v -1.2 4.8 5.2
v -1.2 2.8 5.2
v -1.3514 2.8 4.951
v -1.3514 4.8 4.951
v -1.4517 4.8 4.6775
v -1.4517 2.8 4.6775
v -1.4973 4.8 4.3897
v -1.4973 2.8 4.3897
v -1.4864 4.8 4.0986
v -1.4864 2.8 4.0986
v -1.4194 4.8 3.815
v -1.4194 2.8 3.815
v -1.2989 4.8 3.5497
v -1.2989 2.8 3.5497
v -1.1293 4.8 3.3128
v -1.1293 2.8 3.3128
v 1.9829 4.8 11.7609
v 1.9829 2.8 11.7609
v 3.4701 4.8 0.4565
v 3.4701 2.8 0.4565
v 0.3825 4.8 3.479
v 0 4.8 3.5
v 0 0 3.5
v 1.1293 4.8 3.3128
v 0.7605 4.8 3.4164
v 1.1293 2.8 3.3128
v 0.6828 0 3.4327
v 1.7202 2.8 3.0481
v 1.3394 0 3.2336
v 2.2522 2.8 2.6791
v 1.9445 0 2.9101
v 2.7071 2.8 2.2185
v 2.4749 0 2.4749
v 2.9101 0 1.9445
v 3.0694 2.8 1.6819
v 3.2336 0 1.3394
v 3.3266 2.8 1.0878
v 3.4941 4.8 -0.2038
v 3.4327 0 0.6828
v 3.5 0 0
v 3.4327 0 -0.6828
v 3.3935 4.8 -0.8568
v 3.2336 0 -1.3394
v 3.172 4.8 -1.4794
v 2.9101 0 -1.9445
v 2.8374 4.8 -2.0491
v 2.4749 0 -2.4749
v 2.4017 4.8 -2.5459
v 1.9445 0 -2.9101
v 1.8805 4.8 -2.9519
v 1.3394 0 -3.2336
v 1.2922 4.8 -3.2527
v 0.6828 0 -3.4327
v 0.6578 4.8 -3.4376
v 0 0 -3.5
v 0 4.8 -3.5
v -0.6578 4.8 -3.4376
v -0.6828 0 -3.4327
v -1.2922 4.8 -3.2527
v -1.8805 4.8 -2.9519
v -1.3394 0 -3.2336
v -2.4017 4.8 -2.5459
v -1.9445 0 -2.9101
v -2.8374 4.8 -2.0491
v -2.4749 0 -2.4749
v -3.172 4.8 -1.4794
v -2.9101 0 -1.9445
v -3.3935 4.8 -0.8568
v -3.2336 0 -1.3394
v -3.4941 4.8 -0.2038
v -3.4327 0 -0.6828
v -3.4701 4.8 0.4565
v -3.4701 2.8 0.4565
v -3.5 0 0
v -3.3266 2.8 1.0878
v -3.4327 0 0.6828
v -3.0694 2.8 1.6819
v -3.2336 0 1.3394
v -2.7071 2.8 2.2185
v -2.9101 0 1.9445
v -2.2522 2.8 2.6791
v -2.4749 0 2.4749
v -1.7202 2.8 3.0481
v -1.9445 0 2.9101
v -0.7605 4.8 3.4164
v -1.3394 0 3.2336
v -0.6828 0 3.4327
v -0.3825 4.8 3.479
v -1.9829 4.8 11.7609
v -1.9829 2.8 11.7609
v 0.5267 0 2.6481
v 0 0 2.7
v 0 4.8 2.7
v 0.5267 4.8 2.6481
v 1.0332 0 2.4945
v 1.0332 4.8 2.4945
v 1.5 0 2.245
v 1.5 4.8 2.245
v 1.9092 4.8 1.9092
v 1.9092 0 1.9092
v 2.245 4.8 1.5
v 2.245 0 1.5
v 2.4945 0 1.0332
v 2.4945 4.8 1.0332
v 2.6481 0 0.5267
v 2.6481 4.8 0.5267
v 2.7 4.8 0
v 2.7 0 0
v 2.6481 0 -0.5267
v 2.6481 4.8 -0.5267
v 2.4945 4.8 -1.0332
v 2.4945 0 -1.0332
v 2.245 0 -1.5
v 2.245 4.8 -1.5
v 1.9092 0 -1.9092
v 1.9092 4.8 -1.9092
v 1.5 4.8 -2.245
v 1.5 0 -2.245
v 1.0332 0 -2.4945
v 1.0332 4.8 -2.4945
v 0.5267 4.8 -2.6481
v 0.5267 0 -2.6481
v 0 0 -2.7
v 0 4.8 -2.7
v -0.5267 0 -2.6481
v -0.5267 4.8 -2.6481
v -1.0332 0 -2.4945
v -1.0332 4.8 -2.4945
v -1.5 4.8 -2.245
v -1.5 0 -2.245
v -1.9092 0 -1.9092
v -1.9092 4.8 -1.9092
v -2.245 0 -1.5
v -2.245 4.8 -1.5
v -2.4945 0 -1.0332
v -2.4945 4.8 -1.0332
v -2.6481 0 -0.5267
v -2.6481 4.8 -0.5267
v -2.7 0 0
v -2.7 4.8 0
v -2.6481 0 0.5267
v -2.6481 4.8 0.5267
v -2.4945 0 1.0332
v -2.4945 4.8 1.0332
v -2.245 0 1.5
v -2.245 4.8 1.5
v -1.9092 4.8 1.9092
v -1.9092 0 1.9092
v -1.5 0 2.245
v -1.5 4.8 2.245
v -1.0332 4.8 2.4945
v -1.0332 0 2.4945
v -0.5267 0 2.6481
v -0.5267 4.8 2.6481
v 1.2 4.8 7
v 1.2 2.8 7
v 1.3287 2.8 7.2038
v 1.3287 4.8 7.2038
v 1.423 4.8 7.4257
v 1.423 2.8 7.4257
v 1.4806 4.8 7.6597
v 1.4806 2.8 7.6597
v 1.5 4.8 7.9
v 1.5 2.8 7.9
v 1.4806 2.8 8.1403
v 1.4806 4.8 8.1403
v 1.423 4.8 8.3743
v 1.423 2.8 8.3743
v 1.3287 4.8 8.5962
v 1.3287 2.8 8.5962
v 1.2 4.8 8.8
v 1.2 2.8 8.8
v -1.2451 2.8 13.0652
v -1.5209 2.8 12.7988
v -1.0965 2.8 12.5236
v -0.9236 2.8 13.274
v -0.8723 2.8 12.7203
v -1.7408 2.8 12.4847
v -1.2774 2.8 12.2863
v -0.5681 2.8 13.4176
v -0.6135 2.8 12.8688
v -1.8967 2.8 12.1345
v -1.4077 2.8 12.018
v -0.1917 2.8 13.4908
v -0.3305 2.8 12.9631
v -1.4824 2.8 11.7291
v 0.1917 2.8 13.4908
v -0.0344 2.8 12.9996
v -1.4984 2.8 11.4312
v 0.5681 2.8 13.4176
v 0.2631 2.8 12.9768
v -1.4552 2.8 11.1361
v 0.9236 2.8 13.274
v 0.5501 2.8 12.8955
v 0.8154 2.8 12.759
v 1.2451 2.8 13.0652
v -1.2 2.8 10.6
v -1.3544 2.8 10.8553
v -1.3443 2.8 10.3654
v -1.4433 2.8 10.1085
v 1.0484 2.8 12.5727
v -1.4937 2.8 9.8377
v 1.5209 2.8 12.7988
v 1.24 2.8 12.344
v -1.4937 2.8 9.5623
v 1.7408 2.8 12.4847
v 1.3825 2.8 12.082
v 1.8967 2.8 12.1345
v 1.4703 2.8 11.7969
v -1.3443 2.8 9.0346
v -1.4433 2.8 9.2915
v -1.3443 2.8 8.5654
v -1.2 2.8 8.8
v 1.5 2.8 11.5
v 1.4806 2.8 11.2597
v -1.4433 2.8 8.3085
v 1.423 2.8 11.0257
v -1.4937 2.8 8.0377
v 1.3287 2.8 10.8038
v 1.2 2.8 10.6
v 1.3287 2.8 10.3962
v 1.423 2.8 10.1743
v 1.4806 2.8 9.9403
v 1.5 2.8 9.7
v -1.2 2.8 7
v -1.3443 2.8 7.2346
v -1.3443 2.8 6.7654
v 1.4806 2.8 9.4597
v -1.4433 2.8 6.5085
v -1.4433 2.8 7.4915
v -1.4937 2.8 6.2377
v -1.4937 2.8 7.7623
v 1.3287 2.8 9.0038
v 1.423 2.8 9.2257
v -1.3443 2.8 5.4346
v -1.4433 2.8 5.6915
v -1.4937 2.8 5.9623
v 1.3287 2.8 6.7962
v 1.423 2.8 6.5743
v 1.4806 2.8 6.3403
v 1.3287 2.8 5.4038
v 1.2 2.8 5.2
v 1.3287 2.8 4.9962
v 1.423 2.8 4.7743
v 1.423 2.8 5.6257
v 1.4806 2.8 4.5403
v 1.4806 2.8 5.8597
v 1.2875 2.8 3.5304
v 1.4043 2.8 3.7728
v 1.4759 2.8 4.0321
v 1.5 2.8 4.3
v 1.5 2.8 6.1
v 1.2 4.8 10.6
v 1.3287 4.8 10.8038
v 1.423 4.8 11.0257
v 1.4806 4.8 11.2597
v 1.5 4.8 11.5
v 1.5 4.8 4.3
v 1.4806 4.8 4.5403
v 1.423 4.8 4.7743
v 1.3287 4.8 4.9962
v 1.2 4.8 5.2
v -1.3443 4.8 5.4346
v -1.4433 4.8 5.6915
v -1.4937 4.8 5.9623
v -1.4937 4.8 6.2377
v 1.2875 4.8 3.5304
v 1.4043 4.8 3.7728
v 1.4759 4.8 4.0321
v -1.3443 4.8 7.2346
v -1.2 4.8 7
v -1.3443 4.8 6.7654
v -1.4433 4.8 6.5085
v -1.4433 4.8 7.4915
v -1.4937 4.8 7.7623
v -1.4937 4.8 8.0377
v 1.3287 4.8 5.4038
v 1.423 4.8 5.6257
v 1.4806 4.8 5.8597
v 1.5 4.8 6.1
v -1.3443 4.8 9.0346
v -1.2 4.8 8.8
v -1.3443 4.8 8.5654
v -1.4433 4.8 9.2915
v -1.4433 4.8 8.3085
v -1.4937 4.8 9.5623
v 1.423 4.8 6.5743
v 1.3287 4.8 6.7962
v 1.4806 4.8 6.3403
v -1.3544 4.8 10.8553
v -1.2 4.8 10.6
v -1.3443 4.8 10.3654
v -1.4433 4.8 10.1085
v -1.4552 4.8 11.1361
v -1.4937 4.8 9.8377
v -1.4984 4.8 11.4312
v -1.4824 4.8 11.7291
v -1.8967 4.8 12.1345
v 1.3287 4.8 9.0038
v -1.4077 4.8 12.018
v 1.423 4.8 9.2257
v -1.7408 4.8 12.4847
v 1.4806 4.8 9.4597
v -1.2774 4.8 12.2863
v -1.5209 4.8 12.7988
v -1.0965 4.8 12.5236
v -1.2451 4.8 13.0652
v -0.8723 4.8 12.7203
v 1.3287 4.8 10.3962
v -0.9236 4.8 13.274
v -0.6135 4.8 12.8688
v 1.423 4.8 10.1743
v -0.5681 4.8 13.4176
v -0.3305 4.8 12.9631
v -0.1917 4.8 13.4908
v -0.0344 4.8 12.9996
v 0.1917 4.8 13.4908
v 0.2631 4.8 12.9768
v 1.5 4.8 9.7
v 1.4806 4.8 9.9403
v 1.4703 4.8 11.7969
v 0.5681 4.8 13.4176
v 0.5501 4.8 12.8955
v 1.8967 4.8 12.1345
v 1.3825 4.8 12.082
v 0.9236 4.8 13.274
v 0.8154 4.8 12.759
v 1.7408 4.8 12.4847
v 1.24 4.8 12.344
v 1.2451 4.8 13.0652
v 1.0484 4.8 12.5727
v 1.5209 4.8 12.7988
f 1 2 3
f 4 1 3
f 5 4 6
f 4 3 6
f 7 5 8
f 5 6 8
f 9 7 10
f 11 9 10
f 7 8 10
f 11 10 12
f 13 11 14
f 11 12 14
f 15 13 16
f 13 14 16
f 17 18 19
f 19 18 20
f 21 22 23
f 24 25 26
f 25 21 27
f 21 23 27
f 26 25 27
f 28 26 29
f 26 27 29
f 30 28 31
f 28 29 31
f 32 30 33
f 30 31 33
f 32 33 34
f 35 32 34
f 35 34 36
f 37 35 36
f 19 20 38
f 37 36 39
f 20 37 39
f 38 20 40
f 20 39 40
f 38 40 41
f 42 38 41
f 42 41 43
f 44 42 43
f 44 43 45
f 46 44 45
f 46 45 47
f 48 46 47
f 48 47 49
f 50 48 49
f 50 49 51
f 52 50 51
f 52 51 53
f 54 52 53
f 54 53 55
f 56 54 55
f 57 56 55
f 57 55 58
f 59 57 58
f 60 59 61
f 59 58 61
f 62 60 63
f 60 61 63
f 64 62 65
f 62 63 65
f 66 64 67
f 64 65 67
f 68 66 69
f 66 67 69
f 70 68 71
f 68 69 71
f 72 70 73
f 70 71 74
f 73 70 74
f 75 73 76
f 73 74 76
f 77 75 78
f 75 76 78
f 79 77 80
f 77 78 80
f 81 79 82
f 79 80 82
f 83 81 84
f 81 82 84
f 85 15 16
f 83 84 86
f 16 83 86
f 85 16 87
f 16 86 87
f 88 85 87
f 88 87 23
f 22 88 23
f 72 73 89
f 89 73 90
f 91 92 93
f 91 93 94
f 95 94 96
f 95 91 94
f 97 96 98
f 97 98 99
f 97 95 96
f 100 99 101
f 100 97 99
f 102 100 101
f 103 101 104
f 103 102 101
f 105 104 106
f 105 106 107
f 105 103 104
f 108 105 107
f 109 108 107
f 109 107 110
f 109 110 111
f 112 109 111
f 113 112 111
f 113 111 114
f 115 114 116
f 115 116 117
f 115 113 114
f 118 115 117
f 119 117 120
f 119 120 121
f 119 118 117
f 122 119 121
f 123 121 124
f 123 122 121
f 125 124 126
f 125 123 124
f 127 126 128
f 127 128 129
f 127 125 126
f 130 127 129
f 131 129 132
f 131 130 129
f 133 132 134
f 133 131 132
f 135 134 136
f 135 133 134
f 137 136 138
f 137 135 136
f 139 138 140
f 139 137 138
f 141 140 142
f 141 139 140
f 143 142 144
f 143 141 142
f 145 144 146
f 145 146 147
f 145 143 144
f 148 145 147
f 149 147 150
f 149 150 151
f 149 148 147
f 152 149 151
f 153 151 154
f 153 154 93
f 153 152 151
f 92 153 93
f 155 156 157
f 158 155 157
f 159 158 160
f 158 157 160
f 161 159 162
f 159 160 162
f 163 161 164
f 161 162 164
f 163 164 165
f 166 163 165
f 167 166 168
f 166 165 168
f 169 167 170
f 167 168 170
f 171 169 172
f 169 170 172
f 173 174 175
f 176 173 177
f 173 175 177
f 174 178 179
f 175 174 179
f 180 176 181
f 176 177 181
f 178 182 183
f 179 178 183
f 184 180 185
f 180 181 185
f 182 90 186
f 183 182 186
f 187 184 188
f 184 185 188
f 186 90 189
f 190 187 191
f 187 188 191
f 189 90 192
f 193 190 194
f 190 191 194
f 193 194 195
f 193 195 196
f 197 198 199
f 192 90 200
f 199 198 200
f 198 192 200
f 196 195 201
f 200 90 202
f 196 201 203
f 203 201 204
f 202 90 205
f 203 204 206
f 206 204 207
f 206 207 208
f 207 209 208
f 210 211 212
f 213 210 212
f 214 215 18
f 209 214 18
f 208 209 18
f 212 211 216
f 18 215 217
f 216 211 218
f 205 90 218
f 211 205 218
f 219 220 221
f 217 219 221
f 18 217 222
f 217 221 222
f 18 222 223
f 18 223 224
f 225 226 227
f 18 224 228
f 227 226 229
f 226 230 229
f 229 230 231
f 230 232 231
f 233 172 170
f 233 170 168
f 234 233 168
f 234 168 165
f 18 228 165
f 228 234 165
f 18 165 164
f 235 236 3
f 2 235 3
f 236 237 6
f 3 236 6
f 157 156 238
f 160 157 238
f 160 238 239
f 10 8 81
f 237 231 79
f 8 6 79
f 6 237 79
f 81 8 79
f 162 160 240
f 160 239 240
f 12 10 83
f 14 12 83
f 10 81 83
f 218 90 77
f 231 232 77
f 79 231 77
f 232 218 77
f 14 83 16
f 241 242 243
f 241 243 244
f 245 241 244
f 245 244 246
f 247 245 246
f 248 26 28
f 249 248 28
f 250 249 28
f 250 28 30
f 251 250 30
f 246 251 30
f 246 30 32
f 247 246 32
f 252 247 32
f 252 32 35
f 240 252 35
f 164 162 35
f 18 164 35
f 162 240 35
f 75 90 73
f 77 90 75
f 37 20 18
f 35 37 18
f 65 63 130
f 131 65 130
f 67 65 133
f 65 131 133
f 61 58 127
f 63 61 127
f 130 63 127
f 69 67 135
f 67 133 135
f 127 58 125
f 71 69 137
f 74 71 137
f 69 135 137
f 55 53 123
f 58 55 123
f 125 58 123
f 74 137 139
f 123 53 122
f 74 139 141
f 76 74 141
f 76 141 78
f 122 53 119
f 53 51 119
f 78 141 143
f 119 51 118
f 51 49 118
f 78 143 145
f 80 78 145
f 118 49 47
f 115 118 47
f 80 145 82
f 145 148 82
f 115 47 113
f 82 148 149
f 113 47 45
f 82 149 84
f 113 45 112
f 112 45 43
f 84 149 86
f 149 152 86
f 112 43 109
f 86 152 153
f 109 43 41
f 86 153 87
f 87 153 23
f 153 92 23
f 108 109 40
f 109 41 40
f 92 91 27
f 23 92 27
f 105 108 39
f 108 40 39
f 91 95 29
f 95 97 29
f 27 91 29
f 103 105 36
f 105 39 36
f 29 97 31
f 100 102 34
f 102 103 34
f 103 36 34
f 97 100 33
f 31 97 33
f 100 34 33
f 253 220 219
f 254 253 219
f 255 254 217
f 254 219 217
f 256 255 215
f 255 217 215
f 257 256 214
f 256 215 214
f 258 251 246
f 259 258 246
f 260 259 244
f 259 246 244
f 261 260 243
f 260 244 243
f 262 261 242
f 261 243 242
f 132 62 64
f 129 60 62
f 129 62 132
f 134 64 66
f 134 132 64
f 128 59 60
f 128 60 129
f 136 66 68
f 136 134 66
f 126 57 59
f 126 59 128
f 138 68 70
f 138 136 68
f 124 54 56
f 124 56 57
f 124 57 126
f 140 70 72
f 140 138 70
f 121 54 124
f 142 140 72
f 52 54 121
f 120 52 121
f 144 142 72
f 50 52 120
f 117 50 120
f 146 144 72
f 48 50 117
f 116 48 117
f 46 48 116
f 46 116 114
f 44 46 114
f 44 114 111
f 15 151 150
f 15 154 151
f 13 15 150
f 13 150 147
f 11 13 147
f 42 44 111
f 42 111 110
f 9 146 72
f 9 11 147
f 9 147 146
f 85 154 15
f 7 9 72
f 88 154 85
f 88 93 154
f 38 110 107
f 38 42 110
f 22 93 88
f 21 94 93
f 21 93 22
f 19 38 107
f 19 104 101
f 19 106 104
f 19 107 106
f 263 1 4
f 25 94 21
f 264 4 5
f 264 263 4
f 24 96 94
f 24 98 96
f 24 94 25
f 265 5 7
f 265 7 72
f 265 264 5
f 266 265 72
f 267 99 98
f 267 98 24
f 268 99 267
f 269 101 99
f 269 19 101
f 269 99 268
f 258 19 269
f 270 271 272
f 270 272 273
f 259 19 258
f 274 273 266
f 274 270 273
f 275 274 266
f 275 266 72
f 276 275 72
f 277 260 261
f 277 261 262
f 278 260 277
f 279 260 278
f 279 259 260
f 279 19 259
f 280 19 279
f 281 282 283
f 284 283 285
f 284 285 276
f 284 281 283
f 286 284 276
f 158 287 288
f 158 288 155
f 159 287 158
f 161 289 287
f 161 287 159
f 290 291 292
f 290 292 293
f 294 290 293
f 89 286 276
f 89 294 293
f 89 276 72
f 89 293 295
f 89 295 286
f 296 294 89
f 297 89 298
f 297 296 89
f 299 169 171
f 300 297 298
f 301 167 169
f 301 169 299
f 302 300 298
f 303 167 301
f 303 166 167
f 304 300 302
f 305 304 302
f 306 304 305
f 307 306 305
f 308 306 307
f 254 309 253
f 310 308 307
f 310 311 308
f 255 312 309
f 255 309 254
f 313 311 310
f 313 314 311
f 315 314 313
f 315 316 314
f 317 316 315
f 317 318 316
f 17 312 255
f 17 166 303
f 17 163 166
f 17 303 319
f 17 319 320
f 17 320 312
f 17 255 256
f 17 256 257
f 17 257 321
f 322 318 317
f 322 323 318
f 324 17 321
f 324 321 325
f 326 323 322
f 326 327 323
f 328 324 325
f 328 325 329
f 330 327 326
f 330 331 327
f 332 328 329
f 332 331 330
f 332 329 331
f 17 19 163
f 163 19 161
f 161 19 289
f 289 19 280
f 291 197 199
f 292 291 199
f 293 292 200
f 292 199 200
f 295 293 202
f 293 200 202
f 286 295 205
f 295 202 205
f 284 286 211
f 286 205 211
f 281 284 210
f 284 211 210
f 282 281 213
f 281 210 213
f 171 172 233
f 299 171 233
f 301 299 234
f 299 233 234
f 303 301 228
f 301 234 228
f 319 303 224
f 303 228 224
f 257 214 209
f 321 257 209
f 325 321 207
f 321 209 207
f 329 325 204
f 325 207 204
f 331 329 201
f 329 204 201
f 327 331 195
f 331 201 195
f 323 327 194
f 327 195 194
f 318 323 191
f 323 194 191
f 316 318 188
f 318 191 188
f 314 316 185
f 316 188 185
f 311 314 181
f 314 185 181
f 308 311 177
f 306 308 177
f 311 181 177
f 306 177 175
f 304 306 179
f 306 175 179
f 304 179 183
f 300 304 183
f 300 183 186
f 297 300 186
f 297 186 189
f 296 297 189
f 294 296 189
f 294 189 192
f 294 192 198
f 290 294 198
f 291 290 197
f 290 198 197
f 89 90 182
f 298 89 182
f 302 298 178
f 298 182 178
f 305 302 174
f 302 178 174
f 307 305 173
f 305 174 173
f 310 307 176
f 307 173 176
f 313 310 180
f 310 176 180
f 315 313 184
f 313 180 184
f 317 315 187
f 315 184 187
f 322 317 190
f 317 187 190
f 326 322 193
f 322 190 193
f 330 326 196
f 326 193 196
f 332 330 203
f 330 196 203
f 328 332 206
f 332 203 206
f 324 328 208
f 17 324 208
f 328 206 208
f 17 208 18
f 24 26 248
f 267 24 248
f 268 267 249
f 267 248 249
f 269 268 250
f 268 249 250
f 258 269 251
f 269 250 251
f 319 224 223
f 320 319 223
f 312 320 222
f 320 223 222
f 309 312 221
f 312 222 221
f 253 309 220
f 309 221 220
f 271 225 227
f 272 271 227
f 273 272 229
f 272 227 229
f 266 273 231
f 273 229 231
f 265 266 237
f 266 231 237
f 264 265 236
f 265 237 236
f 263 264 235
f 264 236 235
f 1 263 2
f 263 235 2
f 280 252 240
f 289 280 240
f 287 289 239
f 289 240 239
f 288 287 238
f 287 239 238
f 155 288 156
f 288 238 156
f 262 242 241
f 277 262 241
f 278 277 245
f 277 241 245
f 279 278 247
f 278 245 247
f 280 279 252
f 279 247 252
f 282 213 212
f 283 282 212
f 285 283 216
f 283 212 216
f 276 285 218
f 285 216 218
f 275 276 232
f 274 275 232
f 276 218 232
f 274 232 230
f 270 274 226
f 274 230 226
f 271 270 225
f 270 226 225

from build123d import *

# Parameters (mm, degrees)
SKETCH_1_R      = 3.5
SKETCH_1_R_2    = 2.7
EXTRUDE_1_DEPTH = 4.8
EXTRUDE_START   = -2
EXTRUDE_2_DEPTH = 2


with BuildPart() as part:
    # Эскиз1 → Бобышка-Вытянуть1 (new body)
    with BuildSketch(Plane(origin=(0, 0, 0), x_dir=(1, 0, 0), z_dir=(0, 1, 0))):
        Circle(SKETCH_1_R)
        Circle(SKETCH_1_R_2, mode=Mode.SUBTRACT)
    extrude(amount=EXTRUDE_1_DEPTH)

    # Эскиз2 → Бобышка-Вытянуть2 (add)
    with BuildSketch(Plane(origin=(0, 4.8, 0), x_dir=(1, 0, 0), z_dir=(0, 1, 0)).offset(EXTRUDE_START)):
        with BuildLine():
            ThreePointArc((-1.129343966, -3.312790698), (-2.707080949, -2.218493348), (-3.47009912, -0.456521739))
            Line((-3.47009912, -0.456521739), (-1.982913783, -11.760869565))
            ThreePointArc((-1.982913783, -11.760869565), (0, -13.5), (1.982913783, -11.760869565))
            Line((1.982913783, -11.760869565), (3.47009912, -0.456521739))
            ThreePointArc((3.47009912, -0.456521739), (2.707080949, -2.218493348), (1.129343966, -3.312790698))
            ThreePointArc((1.129343966, -3.312790698), (1.404282014, -3.772750509), (1.5, -4.3))
            ThreePointArc((1.5, -4.3), (1.423024947, -4.774341649), (1.2, -5.2))
            ThreePointArc((1.2, -5.2), (1.423024947, -5.625658351), (1.5, -6.1))
            ThreePointArc((1.5, -6.1), (1.423024947, -6.574341649), (1.2, -7))
            ThreePointArc((1.2, -7), (1.423024947, -7.425658351), (1.5, -7.9))
            ThreePointArc((1.5, -7.9), (1.423024947, -8.374341649), (1.2, -8.8))
            ThreePointArc((1.2, -8.8), (1.423024947, -9.225658351), (1.5, -9.7))
            ThreePointArc((1.5, -9.7), (1.423024947, -10.174341649), (1.2, -10.6))
            ThreePointArc((1.2, -10.6), (1.423024947, -11.025658351), (1.5, -11.5))
            ThreePointArc((1.5, -11.5), (-0.474341649, -12.923024947), (-1.2, -10.6))
            ThreePointArc((-1.2, -10.6), (-1.5, -9.7), (-1.2, -8.8))
            ThreePointArc((-1.2, -8.8), (-1.5, -7.9), (-1.2, -7))
            ThreePointArc((-1.2, -7), (-1.5, -6.1), (-1.2, -5.2))
            ThreePointArc((-1.2, -5.2), (-1.498949821, -4.243880178), (-1.129343966, -3.312790698))
        make_face()
    extrude(amount=EXTRUDE_2_DEPTH)


solid = part.part
